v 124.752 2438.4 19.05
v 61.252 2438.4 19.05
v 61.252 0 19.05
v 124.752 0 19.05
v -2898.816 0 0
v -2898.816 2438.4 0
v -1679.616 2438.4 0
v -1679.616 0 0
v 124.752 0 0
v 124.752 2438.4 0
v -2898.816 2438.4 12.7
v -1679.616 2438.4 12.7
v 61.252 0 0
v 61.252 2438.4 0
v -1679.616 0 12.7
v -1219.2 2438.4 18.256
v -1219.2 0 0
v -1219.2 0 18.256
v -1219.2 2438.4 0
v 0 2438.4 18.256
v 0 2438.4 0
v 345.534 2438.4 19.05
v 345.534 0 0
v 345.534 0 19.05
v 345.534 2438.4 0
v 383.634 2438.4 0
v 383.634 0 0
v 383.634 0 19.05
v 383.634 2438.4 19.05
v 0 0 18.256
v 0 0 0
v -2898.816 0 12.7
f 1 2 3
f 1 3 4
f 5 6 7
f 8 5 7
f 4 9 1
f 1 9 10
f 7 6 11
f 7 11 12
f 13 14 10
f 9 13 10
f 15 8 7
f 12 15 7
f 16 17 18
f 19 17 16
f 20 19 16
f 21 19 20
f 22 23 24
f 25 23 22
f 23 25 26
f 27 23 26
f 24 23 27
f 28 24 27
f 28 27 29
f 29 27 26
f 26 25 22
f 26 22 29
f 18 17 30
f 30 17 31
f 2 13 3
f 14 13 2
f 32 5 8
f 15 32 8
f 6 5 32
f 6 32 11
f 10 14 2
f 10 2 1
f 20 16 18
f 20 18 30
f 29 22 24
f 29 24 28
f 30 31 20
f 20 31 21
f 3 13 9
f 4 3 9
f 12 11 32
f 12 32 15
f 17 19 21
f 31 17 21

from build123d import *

# Parameters (mm, degrees)
F0_W     = 1219.2
F0_H     = 2438.4
F1_DEPTH = 18.25625
F2_W     = 63.5
F2_H     = 2438.4
F2_W_2   = 38.1
F3_DEPTH = 19.05
F4_DEPTH = 12.7


with BuildPart() as f1:
    # F0 (on Top) → F1 (new body)
    with BuildSketch(Plane.XY):
        with Locations((-609.6, 1219.2)):
            Rectangle(F0_W, F0_H)
    extrude(amount=F1_DEPTH)


with BuildPart() as f3:
    # F2 (on Top) → F3 (new body)
    with BuildSketch(Plane.XY):
        with Locations((93.001991, 1219.2)):
            Rectangle(F2_W, F2_H)
        with Locations((364.584205, 1219.2)):
            Rectangle(F2_W_2, F2_H)
    extrude(amount=F3_DEPTH)


with BuildPart() as f4:
    # F0 (on Top) → F4 (new body)
    with BuildSketch(Plane.XY):
        with Locations((-2289.216096, 1219.2)):
            Rectangle(F0_W, F0_H)
    extrude(amount=F4_DEPTH)


solid = Compound([f1.part, f3.part, f4.part])
